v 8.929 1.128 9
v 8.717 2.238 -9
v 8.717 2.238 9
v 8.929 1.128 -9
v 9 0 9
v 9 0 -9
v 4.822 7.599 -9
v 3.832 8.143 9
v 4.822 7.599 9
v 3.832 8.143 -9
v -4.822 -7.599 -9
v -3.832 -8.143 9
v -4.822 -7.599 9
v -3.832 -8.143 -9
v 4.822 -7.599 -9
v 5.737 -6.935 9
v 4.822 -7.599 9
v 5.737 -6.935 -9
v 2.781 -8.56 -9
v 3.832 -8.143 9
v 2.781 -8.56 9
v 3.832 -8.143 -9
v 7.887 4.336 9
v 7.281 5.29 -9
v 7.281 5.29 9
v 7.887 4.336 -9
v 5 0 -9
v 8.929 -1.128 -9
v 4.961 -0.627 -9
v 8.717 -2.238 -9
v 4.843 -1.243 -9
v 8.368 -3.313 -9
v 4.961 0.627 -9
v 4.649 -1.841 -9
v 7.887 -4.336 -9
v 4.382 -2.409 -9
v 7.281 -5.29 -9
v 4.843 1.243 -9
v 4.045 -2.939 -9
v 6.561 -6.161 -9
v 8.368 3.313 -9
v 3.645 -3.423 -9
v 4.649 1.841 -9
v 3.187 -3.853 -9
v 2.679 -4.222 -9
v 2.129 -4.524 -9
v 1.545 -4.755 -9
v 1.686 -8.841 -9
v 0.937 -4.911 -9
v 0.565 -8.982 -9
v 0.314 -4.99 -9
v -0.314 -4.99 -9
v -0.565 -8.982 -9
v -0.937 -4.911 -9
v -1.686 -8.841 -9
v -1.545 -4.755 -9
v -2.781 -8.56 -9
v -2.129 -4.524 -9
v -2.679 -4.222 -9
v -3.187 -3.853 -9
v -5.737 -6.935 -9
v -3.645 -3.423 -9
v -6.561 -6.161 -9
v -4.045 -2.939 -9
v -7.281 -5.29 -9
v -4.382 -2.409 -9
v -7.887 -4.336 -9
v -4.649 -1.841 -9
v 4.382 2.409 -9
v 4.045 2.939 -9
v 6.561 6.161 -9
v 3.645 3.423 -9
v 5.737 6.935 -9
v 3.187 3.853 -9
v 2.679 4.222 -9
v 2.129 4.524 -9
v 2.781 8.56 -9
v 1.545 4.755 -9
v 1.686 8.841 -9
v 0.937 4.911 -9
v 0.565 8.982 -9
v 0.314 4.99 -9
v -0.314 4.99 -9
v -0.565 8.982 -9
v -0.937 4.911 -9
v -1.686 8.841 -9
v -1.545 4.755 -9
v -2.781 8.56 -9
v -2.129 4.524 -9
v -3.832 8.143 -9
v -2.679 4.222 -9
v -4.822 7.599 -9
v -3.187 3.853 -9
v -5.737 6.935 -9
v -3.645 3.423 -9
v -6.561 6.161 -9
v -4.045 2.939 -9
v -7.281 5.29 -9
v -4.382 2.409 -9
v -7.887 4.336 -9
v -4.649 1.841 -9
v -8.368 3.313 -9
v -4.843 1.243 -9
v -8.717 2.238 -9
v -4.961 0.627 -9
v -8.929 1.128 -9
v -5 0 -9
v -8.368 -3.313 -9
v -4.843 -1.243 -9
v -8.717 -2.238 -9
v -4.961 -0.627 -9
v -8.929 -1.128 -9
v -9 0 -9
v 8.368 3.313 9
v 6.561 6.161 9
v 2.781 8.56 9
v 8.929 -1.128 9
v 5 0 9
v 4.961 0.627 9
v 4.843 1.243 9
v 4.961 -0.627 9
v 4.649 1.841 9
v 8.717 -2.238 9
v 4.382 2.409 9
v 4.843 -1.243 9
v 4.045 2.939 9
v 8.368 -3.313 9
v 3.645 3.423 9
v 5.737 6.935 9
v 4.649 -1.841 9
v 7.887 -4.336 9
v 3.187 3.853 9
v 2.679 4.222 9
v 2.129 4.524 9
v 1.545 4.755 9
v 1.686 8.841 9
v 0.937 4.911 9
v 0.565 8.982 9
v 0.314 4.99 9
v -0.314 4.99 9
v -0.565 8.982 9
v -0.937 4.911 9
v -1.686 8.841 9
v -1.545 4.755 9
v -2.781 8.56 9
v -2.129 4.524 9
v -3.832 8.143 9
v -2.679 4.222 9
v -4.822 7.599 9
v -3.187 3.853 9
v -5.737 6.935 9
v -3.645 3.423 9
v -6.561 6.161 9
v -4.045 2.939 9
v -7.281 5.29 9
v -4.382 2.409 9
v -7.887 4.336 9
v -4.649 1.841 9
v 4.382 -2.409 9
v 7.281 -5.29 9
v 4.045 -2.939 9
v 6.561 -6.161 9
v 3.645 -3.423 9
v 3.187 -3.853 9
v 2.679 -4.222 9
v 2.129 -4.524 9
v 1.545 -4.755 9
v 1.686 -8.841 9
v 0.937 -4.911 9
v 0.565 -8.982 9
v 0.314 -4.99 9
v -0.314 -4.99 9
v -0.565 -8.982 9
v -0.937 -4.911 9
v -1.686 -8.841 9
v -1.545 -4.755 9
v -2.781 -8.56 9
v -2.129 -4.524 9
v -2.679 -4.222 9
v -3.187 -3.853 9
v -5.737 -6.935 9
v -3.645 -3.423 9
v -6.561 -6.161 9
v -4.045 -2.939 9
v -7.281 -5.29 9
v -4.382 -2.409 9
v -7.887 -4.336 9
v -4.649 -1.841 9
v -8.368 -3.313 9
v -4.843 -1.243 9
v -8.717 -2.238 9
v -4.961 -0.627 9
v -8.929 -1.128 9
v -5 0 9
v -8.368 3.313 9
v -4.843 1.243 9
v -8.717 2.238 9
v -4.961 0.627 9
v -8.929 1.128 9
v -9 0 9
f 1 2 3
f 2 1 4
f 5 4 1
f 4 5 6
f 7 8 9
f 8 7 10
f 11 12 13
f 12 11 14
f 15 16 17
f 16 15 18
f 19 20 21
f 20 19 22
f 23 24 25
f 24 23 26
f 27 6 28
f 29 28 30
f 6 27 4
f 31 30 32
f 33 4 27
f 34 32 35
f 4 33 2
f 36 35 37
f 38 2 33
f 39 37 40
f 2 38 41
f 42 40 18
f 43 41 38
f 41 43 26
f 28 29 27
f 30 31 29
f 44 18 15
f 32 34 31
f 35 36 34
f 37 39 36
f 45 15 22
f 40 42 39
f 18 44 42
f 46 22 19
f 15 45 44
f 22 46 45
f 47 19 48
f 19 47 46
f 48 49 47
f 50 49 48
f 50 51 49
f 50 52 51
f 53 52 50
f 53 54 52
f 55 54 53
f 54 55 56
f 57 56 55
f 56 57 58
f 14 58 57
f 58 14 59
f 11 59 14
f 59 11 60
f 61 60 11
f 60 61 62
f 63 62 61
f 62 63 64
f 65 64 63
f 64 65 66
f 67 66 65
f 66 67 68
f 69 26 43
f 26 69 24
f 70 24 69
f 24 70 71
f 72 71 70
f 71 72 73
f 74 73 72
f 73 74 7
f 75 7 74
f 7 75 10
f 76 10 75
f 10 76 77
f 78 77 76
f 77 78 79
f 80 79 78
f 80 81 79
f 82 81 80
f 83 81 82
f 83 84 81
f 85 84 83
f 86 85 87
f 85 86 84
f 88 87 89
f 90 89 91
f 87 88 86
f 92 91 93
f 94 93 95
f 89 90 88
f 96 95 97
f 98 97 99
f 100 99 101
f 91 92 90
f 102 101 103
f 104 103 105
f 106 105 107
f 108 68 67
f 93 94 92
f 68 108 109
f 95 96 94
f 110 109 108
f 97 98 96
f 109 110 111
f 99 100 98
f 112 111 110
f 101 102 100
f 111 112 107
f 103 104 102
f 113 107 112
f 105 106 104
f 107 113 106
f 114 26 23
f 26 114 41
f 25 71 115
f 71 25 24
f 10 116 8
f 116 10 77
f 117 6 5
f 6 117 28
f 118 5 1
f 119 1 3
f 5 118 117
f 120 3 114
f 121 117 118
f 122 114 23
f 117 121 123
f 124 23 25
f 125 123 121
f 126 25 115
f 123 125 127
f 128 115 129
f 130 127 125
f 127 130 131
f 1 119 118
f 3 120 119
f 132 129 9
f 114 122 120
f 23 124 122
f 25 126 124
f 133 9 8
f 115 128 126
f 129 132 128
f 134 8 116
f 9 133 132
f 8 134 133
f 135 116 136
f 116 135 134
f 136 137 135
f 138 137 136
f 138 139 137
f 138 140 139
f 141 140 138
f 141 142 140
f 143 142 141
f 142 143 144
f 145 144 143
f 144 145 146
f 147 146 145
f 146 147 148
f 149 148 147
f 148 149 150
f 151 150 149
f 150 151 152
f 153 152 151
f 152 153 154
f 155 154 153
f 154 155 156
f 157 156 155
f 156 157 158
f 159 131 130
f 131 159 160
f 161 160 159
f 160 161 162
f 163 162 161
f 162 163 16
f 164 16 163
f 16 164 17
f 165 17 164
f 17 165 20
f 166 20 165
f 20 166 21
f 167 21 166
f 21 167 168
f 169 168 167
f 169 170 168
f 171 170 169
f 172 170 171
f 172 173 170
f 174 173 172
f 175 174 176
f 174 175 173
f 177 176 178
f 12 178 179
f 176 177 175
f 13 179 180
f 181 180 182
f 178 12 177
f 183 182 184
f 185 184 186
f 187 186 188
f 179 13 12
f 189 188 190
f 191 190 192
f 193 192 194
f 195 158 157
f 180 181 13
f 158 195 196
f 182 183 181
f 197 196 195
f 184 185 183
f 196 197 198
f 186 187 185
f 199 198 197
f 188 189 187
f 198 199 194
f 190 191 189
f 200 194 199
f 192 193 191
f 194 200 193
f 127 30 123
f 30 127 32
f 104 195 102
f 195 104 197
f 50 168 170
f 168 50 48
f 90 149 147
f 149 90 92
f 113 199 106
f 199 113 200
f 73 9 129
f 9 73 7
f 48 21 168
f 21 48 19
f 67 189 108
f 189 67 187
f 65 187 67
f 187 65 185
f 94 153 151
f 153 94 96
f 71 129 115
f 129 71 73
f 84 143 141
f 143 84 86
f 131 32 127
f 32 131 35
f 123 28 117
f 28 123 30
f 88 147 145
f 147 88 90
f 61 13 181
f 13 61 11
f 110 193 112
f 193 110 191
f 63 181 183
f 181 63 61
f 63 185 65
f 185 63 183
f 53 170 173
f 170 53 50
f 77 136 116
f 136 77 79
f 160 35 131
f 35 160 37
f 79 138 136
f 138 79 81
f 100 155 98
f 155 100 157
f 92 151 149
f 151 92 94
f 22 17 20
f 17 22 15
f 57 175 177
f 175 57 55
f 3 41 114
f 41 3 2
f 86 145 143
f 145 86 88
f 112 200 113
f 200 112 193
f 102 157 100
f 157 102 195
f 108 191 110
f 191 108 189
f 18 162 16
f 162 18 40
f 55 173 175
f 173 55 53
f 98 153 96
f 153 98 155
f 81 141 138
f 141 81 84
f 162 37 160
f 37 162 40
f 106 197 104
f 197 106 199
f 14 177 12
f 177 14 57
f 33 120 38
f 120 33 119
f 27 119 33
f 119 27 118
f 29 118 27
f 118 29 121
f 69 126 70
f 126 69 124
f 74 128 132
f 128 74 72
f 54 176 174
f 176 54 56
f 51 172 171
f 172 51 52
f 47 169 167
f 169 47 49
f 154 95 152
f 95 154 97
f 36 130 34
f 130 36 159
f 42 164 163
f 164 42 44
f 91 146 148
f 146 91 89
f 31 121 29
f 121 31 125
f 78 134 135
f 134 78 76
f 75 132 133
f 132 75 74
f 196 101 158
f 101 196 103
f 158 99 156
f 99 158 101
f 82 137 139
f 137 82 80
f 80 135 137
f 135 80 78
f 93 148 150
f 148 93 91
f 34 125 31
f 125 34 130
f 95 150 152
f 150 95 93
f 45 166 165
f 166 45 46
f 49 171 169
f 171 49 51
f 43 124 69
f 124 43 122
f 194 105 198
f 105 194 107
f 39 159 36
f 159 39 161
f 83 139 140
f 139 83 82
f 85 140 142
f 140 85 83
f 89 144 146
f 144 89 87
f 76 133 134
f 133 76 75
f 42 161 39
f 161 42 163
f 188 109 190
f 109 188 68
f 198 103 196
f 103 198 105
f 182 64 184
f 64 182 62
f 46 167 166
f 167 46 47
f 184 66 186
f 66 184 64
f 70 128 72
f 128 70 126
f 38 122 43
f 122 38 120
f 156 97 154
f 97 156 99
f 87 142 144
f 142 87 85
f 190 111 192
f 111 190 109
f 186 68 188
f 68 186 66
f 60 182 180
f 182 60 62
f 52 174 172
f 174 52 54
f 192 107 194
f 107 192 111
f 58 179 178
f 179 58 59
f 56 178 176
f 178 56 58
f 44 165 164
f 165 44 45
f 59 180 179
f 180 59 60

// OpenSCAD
$fn = 50;


difference() {
	union() {
		translate(v = [0, 0, -9.0000000000]) {
			cylinder(h = 18, r = 9.0000000000);
		}
	}
	union() {
		translate(v = [0, 0, -100.0000000000]) {
			cylinder(h = 200, r = 5.0000000000);
		}
	}
}
